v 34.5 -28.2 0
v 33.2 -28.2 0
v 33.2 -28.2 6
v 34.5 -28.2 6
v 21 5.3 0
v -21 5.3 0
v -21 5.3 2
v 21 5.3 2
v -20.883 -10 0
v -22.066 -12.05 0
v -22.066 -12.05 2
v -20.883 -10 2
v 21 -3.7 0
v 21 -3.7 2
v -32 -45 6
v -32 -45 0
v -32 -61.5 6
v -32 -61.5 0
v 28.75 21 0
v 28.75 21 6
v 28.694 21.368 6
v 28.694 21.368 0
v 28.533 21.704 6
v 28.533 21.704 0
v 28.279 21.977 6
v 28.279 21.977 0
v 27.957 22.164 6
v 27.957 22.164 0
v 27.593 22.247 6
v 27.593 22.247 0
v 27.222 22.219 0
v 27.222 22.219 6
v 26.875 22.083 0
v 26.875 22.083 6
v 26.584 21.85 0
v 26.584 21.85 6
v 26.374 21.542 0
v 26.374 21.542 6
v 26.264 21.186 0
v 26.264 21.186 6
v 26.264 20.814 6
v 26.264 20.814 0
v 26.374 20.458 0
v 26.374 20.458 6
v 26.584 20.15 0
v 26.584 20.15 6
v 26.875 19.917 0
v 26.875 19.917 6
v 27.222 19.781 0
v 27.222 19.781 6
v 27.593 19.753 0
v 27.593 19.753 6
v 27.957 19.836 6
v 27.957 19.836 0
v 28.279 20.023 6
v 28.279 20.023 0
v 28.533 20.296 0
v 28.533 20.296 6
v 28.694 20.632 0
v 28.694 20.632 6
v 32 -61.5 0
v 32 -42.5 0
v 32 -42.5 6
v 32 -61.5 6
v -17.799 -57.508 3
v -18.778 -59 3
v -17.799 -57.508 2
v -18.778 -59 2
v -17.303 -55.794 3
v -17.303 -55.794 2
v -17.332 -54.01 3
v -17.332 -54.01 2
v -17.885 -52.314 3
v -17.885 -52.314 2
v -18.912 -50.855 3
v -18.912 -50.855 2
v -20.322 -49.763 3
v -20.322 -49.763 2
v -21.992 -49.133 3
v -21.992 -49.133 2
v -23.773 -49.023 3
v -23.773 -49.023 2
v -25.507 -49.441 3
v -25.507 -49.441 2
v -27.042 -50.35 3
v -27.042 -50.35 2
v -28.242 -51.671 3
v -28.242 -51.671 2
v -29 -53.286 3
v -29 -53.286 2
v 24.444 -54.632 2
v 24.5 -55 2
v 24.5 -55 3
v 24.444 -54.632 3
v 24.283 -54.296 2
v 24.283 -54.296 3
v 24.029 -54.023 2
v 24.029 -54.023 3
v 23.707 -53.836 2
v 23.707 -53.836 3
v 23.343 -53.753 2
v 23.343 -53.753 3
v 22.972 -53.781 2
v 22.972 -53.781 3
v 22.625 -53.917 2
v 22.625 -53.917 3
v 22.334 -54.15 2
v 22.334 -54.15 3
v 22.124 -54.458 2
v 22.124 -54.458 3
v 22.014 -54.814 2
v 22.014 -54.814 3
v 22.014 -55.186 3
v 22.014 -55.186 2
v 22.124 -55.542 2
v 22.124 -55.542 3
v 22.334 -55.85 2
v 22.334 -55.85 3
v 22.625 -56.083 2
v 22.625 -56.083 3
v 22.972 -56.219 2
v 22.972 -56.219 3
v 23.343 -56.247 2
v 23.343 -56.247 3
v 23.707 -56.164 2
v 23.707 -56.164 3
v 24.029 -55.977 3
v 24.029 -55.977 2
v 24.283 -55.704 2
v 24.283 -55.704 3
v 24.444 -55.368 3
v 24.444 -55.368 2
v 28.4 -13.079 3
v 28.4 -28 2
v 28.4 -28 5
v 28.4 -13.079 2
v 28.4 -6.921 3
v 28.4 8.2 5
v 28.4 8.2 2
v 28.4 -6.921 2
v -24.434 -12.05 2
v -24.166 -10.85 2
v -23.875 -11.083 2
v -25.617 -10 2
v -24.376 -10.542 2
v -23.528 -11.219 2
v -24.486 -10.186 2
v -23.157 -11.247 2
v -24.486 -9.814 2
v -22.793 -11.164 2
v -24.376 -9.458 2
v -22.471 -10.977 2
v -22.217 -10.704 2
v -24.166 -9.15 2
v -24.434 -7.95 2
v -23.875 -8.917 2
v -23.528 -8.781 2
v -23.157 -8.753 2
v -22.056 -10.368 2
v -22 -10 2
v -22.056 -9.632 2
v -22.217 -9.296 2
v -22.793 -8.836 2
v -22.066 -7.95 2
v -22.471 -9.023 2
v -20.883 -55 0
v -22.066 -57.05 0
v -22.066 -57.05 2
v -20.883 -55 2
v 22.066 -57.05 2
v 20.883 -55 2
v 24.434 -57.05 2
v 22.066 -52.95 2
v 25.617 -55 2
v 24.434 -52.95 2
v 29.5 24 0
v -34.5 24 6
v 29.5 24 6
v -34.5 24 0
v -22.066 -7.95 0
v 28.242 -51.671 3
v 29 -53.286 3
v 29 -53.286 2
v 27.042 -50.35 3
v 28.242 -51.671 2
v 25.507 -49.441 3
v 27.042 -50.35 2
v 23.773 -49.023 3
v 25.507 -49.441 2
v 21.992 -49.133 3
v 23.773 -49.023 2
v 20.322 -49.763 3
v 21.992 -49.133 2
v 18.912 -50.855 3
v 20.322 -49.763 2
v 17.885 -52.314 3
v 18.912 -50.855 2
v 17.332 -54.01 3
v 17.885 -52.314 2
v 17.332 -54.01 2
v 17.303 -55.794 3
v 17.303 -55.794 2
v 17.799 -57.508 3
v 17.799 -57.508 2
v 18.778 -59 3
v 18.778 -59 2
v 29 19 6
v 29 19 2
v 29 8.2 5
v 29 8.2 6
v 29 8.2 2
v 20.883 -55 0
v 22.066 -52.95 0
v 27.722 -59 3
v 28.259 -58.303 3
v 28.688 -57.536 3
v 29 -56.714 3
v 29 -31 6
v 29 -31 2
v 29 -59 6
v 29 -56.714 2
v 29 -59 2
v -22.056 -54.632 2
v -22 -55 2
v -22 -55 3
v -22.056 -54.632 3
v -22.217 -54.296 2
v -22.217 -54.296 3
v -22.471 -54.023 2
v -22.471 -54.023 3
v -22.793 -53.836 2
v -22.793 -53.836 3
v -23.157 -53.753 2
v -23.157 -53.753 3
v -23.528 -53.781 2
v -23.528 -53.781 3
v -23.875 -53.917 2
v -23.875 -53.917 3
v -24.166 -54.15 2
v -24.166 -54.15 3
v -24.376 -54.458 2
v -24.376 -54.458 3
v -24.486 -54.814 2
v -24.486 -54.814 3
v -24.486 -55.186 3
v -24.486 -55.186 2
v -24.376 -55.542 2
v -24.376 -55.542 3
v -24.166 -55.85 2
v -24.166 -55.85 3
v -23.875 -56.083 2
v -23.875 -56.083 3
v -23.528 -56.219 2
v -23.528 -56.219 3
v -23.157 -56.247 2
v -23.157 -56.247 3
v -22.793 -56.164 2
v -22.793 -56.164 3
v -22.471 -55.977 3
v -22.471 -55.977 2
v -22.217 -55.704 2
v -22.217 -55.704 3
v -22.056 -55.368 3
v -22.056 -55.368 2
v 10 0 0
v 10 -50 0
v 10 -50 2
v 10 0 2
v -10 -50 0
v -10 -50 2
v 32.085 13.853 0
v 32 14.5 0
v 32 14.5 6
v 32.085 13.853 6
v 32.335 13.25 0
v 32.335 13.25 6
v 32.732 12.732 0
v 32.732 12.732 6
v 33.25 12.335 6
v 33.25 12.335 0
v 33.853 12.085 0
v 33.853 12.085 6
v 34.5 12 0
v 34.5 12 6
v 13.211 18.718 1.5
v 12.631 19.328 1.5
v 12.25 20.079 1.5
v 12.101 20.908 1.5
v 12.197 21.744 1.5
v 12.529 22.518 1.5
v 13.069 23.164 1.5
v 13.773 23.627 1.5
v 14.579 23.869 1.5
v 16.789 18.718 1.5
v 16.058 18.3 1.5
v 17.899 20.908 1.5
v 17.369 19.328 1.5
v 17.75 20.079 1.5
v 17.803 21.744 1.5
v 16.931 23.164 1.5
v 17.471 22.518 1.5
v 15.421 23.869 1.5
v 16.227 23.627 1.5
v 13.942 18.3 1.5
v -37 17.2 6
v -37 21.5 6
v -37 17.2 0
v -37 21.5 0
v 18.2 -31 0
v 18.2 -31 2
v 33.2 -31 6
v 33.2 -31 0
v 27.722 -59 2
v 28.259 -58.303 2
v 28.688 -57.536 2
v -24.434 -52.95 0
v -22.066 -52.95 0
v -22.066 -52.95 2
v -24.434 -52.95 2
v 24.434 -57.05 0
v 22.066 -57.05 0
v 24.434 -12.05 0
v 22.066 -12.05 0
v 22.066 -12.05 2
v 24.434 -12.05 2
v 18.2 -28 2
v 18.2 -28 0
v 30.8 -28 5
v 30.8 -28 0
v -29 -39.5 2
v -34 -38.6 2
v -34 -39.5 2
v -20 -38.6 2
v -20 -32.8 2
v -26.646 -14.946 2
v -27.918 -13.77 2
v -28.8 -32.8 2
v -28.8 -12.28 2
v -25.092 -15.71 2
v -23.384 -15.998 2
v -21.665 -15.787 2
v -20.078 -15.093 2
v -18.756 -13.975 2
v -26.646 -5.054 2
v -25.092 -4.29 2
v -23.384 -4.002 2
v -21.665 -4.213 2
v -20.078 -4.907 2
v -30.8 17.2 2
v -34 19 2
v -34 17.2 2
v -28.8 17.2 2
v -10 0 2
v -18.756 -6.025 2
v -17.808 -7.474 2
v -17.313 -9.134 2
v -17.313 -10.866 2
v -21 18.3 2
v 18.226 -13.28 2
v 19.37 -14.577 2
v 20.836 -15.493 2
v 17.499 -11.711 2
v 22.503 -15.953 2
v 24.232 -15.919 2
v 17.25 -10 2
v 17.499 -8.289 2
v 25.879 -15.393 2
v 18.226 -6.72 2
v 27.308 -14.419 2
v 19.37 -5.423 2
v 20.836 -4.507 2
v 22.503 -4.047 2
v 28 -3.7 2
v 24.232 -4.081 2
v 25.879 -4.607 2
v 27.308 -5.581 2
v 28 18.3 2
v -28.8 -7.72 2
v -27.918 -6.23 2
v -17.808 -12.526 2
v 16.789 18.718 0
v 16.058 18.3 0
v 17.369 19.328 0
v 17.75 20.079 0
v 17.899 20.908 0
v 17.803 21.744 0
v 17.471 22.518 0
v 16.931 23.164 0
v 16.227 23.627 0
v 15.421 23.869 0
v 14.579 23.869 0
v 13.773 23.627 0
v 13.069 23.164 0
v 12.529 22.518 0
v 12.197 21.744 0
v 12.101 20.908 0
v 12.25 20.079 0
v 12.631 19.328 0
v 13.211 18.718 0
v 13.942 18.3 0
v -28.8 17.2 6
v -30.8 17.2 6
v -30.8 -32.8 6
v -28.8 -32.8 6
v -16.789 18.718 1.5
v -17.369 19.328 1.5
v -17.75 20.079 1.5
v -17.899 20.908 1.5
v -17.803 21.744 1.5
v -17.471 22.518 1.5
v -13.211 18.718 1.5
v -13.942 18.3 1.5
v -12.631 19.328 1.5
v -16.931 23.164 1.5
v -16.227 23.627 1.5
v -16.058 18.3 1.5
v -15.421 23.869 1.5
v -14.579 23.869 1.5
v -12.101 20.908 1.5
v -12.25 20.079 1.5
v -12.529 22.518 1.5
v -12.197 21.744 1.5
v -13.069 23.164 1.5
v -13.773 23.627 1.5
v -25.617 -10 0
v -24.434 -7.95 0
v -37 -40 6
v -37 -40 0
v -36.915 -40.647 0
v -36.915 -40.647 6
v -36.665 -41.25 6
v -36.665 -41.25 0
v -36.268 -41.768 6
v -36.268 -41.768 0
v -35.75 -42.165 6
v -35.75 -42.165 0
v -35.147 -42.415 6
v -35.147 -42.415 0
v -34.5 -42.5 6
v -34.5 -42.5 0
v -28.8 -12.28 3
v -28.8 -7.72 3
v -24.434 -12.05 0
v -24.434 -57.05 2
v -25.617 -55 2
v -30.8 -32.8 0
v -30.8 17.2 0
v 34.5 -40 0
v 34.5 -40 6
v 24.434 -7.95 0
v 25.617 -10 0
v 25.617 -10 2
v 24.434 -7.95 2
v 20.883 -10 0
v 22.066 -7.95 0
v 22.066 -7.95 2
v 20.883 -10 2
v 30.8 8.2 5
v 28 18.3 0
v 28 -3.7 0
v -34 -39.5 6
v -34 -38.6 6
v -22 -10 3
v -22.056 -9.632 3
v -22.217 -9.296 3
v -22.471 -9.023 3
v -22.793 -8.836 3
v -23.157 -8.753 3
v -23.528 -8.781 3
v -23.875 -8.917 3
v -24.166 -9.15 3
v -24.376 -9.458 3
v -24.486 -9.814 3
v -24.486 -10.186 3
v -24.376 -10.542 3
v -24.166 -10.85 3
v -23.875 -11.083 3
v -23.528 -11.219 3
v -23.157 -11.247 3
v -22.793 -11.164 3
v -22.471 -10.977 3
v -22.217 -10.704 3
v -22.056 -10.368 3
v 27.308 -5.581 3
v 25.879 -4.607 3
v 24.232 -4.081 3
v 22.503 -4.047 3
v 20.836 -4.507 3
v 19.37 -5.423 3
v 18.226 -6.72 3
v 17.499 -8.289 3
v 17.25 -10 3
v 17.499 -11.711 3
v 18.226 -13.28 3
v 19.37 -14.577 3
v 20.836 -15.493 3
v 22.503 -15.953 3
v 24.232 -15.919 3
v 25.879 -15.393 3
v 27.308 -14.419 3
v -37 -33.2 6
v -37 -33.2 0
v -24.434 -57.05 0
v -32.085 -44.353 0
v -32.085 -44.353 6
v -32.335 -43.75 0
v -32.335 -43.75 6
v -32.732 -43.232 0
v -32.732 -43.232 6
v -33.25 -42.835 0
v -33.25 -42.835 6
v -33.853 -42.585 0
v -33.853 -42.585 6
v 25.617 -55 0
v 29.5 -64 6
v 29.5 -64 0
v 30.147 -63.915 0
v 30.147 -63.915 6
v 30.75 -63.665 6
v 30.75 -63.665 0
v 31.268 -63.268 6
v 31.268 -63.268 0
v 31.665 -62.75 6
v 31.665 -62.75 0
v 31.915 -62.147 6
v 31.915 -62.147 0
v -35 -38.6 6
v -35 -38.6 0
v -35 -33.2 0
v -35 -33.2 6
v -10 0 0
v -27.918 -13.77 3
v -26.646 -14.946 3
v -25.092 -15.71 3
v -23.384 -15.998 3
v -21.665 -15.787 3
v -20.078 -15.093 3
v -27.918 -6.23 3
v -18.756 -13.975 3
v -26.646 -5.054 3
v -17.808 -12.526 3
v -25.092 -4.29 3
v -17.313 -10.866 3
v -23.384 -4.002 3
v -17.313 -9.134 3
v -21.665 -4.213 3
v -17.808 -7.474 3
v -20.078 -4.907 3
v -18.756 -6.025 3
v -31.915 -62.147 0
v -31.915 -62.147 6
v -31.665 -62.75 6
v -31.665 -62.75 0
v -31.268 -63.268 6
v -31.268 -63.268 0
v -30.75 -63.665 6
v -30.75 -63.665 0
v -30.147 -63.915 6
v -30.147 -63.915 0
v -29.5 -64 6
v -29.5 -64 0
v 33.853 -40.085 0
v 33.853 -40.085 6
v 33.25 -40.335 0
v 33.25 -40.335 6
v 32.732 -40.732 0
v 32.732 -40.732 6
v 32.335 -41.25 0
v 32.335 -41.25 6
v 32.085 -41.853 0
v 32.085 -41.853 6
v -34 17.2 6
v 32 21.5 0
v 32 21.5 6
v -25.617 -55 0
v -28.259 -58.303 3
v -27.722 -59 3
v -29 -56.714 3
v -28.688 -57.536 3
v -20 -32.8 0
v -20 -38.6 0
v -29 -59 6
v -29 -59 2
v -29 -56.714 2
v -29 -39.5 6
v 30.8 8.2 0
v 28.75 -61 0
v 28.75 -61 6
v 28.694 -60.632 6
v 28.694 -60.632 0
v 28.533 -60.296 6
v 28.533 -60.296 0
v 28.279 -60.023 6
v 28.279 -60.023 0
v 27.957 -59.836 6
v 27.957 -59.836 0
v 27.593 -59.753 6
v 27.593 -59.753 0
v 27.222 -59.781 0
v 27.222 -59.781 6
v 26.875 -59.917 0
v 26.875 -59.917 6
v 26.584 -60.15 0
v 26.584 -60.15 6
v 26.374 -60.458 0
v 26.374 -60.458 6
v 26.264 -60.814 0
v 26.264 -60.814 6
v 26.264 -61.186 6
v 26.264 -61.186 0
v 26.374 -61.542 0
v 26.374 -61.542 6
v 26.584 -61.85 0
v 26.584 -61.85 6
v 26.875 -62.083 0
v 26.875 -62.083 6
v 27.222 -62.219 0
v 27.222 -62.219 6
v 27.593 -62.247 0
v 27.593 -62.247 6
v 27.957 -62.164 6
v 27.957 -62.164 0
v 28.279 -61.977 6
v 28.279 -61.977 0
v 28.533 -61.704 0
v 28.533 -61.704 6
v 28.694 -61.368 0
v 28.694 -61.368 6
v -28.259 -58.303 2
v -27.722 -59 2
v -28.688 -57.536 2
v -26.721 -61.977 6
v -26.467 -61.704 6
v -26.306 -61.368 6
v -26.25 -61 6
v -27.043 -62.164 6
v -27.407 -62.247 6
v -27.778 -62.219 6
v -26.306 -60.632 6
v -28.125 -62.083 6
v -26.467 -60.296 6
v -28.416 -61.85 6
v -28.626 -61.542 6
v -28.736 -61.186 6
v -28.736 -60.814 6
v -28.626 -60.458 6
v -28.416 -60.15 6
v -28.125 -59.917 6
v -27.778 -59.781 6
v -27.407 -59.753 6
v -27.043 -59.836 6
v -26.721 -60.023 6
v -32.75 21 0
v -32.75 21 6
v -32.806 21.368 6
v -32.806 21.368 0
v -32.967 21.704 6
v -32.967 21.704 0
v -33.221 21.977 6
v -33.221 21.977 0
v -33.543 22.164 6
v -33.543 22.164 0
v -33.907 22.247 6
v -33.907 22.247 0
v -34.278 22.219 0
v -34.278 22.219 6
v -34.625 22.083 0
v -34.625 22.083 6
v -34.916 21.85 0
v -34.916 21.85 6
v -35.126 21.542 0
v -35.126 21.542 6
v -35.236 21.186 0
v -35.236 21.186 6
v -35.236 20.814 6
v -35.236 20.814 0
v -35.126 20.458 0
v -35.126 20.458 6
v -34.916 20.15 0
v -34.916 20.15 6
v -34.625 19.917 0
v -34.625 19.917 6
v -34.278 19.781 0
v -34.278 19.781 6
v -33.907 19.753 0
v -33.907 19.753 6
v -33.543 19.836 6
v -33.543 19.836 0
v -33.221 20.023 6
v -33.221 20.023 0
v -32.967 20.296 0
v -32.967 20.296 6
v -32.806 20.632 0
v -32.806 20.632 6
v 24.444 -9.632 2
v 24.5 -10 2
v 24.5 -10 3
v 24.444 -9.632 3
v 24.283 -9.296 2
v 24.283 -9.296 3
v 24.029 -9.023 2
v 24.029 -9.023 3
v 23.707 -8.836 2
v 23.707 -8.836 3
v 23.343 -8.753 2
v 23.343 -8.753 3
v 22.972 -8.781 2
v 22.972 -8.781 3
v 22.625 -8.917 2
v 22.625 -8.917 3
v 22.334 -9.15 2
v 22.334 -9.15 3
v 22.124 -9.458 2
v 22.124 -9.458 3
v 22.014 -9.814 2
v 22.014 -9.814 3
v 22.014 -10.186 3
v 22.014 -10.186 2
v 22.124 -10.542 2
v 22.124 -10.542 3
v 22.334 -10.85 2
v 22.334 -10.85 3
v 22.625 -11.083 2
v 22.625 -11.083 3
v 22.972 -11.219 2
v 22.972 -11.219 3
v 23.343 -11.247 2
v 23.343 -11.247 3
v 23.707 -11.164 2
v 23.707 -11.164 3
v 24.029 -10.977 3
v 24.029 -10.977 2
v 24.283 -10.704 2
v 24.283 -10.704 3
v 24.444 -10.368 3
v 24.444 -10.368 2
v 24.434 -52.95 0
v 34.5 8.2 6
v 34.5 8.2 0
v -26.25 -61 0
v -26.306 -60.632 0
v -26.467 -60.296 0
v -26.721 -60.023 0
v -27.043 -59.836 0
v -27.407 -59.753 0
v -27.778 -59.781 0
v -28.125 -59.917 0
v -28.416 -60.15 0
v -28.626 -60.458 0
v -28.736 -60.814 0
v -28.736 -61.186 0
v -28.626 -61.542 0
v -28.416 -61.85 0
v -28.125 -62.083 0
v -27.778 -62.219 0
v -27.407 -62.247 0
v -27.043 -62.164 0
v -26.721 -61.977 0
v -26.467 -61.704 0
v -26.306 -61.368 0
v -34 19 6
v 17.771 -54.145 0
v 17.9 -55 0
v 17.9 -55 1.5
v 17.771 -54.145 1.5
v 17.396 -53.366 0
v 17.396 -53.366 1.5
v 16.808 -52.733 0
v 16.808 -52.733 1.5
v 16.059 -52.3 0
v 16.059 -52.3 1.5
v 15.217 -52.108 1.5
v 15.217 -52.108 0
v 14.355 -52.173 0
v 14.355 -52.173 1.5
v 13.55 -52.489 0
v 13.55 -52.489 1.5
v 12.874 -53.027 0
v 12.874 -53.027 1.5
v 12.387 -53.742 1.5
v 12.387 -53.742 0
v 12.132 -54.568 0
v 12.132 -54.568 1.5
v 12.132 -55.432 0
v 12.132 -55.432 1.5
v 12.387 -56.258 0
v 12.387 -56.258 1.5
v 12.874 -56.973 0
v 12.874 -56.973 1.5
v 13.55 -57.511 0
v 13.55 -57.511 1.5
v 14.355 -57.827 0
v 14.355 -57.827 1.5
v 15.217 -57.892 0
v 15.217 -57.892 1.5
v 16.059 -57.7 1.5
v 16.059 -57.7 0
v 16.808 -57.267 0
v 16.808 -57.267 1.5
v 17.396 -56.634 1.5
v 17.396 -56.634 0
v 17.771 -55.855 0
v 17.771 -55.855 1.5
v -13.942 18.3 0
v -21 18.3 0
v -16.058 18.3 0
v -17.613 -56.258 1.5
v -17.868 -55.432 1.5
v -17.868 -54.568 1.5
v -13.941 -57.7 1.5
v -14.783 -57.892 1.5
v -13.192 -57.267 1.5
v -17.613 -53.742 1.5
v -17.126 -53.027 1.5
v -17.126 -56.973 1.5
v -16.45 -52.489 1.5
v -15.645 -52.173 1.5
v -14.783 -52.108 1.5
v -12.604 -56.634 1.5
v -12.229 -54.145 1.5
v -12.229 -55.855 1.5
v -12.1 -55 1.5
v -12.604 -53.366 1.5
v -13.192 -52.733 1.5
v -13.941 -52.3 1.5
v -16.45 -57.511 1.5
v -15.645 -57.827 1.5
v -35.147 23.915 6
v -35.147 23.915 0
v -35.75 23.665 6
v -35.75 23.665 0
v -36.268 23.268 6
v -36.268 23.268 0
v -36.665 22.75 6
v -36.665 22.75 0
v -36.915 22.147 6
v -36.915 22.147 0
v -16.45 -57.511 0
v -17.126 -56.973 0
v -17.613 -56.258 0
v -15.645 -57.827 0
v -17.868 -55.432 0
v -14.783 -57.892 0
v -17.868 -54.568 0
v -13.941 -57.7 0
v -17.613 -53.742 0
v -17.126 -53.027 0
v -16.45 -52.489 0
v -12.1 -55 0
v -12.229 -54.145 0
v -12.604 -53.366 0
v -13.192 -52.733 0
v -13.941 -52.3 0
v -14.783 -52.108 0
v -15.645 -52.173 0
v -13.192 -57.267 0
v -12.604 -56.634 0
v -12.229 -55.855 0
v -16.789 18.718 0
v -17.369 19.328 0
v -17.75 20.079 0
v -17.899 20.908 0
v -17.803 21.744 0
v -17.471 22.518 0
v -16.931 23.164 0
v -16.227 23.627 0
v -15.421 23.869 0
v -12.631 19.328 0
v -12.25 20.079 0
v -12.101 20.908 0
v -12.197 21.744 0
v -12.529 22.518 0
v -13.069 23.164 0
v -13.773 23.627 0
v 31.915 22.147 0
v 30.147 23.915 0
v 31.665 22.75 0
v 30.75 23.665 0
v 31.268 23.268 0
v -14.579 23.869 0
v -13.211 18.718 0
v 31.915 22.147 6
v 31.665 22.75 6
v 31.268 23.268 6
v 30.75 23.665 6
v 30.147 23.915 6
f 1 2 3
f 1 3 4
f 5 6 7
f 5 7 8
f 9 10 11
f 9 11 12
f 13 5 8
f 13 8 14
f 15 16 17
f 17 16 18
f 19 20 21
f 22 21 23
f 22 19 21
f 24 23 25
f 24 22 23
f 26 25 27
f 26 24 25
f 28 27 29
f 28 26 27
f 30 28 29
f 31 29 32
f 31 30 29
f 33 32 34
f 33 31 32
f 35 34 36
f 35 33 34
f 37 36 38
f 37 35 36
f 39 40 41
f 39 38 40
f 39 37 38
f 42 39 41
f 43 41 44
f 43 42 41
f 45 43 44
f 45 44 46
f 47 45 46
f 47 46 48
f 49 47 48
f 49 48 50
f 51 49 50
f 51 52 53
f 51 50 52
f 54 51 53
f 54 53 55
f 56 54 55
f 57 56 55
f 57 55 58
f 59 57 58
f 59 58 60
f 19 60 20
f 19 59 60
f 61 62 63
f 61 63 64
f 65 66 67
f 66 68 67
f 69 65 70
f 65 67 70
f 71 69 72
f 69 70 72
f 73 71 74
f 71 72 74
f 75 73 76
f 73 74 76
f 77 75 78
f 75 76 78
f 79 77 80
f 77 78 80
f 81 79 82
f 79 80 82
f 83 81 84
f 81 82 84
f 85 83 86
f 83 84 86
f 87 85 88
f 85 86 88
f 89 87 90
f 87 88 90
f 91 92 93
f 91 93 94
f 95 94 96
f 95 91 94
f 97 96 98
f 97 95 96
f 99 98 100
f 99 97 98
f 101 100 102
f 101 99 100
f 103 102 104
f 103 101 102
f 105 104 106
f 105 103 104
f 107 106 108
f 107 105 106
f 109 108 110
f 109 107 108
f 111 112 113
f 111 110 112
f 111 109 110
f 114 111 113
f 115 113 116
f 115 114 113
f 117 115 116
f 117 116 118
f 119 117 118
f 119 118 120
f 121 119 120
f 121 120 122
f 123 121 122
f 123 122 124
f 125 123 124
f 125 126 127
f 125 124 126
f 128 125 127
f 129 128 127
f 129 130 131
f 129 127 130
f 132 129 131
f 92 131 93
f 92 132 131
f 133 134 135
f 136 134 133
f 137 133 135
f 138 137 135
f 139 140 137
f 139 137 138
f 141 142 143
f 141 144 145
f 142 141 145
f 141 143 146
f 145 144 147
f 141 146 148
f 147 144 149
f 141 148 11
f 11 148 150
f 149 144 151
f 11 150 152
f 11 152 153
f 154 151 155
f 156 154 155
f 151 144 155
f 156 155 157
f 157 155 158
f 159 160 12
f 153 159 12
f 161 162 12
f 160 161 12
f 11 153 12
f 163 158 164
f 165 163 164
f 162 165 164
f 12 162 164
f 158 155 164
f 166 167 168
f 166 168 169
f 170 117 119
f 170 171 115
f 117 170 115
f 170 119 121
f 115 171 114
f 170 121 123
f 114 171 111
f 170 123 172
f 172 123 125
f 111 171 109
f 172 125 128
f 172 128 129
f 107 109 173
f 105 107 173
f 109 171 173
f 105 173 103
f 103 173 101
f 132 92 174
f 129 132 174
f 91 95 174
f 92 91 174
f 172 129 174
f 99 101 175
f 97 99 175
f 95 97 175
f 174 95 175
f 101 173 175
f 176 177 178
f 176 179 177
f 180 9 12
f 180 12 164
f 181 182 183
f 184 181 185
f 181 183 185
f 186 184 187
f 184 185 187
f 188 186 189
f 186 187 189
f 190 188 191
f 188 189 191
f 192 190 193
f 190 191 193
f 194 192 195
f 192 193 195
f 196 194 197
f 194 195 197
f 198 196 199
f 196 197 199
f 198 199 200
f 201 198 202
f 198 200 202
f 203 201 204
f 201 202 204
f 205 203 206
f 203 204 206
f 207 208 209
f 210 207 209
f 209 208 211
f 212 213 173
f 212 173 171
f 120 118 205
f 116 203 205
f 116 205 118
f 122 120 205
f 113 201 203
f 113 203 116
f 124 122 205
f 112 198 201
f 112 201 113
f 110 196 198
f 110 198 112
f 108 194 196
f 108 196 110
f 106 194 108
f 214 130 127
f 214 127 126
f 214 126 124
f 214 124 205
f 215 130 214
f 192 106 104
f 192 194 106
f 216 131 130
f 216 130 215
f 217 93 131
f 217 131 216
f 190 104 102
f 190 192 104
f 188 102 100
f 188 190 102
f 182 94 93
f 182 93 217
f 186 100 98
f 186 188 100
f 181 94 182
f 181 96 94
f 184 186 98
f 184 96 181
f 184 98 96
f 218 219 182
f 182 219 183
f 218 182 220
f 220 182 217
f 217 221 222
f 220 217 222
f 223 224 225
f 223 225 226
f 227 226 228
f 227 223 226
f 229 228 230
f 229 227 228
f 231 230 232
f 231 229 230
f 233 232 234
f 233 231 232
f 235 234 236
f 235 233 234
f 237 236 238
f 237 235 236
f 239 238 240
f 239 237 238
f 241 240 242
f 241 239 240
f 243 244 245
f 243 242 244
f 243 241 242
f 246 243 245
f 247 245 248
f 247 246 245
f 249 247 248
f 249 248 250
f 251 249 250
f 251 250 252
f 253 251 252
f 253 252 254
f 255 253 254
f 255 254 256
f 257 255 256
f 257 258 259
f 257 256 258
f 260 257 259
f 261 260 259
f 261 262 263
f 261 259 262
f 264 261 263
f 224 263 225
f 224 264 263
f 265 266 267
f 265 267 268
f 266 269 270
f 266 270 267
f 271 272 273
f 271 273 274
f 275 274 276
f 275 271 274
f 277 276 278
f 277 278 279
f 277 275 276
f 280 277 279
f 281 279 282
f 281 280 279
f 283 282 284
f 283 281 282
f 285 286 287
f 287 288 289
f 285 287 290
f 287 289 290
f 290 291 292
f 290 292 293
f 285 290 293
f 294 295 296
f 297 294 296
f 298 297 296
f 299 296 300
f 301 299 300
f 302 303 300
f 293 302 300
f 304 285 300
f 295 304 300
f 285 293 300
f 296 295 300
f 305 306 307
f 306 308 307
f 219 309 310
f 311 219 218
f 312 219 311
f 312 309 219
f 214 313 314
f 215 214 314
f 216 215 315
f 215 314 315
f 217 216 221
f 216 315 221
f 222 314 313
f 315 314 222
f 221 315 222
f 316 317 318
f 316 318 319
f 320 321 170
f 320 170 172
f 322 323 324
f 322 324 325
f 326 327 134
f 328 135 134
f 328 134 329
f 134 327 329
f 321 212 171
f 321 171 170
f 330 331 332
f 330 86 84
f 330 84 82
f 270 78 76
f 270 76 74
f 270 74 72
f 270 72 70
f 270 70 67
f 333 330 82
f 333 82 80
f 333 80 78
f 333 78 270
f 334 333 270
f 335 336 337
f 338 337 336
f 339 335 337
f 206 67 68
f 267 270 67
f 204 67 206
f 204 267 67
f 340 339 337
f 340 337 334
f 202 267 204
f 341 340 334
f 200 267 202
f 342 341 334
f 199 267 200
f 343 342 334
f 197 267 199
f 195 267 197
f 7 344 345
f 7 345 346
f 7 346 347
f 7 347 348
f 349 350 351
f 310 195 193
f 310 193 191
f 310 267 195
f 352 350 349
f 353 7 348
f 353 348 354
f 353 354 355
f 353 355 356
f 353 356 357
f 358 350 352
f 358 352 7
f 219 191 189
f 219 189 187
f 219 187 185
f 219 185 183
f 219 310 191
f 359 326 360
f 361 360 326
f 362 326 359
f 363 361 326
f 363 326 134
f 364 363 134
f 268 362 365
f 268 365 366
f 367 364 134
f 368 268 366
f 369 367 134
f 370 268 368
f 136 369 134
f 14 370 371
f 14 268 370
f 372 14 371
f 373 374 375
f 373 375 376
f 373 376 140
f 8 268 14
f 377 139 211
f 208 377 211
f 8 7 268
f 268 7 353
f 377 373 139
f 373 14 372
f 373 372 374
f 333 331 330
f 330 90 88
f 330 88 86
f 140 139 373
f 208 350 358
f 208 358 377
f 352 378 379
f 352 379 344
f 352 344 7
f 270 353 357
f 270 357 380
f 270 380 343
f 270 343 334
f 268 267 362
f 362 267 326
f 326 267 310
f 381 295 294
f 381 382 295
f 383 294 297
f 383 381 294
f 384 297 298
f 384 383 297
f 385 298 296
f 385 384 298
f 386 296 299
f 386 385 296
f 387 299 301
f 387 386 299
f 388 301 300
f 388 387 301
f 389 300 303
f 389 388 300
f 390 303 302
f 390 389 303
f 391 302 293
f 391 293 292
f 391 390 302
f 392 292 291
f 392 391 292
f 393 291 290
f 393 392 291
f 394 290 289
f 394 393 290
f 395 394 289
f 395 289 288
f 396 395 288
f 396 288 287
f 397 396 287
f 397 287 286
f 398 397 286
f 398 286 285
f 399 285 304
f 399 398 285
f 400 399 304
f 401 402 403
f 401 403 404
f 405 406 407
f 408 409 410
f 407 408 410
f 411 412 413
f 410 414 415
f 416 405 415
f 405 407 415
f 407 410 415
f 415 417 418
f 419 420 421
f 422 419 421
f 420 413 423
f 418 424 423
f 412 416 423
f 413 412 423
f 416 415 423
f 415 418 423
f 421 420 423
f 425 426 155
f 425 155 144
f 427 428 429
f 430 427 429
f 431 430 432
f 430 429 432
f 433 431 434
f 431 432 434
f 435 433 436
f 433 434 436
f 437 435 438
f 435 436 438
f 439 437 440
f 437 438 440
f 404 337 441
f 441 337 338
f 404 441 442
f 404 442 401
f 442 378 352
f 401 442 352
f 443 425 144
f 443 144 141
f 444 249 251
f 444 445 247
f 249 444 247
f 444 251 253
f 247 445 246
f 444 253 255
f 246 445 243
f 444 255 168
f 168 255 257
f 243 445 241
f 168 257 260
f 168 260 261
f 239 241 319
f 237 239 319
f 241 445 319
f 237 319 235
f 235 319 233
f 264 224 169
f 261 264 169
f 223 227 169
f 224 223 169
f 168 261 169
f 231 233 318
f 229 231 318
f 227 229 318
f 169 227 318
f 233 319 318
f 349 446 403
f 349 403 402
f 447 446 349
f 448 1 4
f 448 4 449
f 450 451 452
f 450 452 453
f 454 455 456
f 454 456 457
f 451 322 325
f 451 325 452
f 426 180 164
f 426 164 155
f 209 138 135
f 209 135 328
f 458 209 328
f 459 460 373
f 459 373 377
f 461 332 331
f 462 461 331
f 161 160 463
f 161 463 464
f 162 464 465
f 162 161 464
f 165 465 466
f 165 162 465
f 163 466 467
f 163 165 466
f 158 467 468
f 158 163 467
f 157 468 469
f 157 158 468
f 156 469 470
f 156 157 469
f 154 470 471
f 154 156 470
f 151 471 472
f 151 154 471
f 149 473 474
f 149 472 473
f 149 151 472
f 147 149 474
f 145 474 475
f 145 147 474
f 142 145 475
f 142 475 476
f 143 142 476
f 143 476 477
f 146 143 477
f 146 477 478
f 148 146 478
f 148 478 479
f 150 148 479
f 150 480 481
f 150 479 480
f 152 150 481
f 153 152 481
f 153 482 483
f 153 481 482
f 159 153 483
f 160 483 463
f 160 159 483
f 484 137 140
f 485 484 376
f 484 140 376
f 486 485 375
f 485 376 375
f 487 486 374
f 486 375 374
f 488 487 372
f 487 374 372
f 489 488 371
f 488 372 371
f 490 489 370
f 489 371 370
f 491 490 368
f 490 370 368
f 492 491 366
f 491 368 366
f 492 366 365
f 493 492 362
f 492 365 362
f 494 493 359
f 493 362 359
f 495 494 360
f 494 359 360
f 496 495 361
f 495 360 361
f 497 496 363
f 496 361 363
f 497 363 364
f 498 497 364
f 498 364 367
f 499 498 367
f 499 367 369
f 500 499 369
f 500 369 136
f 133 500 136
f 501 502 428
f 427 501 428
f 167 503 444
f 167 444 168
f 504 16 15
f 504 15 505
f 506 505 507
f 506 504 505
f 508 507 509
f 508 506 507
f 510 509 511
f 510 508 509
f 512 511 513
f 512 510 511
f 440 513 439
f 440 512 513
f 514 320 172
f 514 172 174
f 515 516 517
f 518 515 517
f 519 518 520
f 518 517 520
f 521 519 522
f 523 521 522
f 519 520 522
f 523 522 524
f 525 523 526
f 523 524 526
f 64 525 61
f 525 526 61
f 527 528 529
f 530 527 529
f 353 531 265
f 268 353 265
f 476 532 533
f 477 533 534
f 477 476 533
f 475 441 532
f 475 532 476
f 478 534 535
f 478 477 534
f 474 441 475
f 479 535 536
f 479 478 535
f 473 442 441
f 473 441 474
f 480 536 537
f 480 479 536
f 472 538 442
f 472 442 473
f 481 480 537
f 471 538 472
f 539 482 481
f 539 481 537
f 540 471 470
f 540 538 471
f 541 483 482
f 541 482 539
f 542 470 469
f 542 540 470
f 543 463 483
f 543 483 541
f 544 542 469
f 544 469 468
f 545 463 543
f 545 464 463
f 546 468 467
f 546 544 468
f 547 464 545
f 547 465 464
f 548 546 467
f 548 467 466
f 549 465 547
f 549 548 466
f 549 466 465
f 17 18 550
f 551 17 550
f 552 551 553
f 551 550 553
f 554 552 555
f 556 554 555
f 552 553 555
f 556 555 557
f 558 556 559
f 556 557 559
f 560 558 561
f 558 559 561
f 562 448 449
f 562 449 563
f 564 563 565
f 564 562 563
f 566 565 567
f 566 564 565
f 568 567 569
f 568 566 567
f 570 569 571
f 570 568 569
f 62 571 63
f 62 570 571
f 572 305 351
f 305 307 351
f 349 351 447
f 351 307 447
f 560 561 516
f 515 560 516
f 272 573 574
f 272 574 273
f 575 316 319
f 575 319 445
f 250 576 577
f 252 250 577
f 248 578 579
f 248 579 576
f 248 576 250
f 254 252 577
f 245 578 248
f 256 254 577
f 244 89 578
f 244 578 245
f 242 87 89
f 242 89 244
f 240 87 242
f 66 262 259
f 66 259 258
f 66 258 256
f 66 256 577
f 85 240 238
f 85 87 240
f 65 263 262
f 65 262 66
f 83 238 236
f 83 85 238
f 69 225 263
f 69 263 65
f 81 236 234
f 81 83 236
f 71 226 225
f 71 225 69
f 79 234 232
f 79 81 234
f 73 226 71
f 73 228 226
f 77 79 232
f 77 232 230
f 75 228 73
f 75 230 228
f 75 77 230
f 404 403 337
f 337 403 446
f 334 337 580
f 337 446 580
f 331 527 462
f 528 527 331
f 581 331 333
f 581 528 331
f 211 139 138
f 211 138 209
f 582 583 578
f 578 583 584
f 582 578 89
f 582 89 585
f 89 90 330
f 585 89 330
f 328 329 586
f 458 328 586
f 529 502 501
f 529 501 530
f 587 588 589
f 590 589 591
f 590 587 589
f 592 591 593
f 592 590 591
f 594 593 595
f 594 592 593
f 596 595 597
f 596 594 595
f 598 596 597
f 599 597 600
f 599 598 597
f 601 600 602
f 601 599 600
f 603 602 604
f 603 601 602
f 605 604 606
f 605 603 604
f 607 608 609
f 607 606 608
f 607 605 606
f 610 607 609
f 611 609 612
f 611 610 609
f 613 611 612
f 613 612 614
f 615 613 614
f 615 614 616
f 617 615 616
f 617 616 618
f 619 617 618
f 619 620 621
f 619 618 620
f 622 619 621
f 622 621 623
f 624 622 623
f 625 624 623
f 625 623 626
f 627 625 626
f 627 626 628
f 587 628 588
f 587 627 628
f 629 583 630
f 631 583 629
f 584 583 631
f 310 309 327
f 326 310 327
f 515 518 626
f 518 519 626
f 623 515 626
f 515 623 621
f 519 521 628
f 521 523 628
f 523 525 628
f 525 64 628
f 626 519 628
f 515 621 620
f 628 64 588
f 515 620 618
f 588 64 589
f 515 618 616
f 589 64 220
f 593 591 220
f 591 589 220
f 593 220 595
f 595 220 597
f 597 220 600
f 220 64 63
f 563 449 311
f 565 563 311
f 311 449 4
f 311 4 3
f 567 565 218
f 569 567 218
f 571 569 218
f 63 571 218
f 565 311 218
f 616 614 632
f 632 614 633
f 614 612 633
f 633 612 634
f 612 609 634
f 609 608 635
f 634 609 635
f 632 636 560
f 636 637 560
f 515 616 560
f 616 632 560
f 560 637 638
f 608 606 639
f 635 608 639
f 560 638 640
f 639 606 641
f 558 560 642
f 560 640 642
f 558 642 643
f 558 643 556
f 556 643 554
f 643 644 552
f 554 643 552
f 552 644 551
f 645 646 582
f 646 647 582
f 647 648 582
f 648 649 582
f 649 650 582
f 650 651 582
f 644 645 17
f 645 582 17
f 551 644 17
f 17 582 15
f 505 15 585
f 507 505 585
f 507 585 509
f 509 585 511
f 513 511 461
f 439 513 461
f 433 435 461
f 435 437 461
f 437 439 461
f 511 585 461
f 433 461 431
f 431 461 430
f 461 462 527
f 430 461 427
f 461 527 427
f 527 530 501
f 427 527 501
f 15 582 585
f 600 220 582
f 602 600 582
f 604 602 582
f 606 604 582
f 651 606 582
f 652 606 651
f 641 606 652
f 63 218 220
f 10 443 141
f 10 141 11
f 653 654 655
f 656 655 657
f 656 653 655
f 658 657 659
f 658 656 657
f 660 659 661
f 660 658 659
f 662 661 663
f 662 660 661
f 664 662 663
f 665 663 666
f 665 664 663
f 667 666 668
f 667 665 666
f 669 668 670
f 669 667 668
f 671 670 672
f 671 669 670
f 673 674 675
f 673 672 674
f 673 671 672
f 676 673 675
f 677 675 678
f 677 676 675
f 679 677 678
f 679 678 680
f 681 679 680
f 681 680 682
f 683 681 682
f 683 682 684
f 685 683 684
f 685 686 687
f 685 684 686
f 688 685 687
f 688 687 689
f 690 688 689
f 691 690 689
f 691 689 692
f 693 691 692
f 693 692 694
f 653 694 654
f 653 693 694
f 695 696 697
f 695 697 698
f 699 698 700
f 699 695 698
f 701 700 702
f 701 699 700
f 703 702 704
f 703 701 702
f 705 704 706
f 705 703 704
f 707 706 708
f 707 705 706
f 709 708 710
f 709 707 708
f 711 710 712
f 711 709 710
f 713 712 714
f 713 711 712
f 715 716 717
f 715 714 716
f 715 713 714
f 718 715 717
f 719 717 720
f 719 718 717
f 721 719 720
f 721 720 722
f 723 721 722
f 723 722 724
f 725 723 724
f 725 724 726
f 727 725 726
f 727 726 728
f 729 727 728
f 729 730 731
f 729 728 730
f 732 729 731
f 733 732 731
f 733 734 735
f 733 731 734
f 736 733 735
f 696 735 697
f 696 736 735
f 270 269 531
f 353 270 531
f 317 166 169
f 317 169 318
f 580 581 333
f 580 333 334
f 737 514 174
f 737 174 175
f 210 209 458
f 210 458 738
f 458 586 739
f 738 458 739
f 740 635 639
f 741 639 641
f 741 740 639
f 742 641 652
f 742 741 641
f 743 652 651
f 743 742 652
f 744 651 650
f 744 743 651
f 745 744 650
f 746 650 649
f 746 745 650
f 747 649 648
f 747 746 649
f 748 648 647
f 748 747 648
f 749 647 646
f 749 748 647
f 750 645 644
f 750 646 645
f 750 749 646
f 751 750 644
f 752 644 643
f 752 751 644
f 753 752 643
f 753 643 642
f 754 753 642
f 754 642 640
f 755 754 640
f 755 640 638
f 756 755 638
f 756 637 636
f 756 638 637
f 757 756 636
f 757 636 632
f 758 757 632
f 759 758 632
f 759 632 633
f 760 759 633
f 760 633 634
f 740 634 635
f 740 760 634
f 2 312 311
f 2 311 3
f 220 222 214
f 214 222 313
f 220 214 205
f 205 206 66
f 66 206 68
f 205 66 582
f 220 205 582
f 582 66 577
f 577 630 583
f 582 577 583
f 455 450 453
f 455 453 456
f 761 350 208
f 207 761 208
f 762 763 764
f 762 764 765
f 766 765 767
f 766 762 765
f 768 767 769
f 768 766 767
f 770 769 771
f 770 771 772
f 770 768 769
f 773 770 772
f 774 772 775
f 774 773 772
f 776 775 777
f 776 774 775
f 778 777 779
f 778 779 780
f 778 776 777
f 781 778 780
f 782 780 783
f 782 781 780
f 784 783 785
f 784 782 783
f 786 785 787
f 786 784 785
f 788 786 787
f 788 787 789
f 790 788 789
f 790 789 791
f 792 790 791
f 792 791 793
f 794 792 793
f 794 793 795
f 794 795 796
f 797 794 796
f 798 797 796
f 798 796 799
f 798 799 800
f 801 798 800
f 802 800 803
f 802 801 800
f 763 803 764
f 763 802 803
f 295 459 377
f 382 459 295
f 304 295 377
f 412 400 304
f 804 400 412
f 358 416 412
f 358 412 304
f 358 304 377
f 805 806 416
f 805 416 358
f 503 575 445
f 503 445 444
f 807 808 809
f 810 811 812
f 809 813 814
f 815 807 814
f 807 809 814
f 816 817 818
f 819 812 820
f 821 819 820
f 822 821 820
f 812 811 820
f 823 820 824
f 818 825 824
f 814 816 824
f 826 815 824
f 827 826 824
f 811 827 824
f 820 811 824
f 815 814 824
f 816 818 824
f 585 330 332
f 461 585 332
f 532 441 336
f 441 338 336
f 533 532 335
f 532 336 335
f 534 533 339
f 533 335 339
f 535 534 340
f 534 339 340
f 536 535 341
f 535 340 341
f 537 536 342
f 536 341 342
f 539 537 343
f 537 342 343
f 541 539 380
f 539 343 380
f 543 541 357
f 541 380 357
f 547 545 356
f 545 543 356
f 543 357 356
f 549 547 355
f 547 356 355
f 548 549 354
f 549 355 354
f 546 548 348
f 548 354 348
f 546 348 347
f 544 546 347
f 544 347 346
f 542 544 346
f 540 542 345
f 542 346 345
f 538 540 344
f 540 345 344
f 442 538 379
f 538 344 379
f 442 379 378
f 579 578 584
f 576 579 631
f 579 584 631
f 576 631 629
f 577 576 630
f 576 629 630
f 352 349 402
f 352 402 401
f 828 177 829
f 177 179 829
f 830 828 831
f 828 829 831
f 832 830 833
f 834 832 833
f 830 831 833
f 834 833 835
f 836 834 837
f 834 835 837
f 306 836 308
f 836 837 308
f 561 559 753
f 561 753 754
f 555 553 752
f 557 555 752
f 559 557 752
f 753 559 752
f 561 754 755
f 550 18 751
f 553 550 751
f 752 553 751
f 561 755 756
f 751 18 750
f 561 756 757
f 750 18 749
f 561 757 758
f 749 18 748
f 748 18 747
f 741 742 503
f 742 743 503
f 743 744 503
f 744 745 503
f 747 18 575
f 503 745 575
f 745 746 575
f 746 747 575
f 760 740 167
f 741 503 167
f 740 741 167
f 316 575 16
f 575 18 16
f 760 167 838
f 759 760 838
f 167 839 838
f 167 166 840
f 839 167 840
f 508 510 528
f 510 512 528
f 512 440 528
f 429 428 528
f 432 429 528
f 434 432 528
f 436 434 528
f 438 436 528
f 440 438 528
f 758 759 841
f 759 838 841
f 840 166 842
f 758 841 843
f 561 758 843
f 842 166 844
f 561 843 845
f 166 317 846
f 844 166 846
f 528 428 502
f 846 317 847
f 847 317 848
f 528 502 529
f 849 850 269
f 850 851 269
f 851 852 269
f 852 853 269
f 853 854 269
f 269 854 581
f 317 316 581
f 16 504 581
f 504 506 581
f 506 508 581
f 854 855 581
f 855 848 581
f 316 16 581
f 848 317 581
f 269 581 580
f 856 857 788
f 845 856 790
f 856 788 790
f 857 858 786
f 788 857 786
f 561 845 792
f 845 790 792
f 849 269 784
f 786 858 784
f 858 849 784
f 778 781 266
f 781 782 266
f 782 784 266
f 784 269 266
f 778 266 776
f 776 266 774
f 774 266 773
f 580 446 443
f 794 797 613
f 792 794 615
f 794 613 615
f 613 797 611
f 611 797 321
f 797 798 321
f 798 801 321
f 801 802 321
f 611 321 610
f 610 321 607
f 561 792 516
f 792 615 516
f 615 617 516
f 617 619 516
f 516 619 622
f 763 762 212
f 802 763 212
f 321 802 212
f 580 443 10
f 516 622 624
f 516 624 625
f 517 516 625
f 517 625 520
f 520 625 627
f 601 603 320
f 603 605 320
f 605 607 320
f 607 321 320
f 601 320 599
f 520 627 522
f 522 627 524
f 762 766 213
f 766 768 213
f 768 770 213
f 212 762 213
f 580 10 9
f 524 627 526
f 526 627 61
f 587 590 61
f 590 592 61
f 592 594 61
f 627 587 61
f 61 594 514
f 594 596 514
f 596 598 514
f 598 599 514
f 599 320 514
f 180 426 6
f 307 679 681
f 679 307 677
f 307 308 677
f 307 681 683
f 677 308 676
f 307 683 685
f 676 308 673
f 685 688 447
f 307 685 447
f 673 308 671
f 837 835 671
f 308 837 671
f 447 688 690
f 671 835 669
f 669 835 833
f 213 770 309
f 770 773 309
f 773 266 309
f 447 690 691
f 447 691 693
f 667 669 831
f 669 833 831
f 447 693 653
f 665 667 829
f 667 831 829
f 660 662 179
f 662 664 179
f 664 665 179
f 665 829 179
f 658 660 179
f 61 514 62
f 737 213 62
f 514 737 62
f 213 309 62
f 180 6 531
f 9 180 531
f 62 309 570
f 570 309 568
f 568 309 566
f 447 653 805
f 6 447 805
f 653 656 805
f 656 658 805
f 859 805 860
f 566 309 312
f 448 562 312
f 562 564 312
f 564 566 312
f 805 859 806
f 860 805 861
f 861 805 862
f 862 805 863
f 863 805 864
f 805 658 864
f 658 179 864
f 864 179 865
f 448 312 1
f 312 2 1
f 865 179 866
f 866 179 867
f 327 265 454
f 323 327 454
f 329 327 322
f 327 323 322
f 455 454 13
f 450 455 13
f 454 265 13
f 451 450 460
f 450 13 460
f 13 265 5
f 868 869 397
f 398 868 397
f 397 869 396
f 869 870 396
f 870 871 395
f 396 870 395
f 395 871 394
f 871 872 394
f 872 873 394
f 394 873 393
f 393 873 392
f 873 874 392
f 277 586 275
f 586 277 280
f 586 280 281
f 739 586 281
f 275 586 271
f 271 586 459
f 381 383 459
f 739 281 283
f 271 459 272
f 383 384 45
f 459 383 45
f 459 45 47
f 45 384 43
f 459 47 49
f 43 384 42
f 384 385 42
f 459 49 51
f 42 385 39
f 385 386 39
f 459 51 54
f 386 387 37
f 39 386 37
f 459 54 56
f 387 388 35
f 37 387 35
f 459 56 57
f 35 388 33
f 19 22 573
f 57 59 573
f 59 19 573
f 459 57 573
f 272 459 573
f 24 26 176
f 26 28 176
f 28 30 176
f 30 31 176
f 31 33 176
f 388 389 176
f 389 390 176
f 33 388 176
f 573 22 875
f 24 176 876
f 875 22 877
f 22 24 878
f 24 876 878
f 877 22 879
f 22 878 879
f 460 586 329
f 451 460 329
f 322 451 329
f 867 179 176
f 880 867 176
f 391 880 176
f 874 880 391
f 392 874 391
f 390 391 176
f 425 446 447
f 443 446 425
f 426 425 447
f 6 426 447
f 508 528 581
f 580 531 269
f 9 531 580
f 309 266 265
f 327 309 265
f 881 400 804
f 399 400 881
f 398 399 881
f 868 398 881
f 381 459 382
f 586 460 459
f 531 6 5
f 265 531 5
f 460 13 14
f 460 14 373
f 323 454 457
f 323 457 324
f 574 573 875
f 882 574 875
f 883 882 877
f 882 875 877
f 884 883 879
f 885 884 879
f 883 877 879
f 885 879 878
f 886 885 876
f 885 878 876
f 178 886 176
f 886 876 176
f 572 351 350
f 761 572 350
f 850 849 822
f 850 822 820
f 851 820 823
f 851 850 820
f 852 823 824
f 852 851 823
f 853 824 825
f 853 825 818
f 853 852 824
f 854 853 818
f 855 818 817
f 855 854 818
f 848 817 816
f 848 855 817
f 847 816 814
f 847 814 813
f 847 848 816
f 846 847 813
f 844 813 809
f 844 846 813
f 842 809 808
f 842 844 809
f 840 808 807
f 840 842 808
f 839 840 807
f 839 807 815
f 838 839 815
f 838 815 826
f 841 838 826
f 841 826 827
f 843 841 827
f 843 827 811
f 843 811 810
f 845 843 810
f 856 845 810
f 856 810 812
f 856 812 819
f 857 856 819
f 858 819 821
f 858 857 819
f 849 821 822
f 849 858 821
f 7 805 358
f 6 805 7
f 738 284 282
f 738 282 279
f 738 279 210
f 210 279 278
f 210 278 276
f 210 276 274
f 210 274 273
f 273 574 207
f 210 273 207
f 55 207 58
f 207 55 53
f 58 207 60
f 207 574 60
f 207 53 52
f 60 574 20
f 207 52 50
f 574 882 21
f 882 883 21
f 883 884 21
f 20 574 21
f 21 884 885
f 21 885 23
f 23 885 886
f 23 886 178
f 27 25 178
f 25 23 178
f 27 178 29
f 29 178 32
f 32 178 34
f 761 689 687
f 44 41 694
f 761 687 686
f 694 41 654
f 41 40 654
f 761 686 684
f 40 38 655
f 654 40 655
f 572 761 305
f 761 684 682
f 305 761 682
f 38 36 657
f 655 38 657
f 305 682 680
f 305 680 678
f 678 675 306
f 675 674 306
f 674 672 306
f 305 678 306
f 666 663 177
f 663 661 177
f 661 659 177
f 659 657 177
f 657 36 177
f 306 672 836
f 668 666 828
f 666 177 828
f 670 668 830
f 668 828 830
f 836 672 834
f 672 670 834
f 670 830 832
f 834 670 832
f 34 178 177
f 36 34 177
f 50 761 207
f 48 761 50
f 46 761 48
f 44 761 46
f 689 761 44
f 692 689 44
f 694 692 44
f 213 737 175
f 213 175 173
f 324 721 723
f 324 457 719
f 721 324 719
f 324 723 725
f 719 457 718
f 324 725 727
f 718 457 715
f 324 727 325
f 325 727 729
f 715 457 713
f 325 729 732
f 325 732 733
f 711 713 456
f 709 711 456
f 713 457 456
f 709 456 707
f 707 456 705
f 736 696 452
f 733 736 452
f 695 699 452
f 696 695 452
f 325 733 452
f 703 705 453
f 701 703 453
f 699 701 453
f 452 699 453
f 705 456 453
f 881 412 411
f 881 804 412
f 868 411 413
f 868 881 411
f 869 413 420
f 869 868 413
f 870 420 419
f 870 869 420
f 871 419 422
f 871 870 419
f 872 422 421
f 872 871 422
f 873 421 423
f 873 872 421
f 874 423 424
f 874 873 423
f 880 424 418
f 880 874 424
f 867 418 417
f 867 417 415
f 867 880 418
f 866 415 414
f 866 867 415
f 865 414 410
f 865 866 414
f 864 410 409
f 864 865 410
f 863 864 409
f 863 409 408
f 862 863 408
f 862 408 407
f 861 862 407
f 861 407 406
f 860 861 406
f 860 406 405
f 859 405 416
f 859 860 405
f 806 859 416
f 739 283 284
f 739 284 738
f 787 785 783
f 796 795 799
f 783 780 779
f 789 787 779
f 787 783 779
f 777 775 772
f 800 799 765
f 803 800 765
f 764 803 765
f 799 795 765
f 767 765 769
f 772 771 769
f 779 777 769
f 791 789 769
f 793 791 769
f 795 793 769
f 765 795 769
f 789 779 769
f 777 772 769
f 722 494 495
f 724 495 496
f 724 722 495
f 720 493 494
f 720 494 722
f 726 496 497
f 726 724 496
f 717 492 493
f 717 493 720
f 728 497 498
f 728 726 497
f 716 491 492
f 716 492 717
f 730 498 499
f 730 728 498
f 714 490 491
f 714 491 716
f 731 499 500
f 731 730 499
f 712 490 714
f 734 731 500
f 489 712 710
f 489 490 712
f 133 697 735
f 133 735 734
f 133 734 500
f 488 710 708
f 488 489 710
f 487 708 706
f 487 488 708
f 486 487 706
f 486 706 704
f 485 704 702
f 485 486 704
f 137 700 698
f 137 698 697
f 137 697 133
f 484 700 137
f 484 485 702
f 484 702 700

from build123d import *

# Parameters (mm, degrees)
PAD_DEPTH            = 2
SKETCH002_R          = 6
PAD002_DEPTH         = 3
POCKET_DEPTH         = 3.001
SKETCH005_R          = 1.25
POCKET001_DEPTH      = 0.001
POCKET001_DEPTH_BACK = 3.001
POCKET002_DEPTH      = 2
SKETCH012_W          = 25
SKETCH012_H          = 50.4
SKETCH012_H_2        = 36.4
POCKET006_DEPTH      = 0.001
POCKET006_DEPTH_BACK = 3.001
SKETCH014_W          = 2
SKETCH014_H          = 50.4
PAD006_DEPTH         = 4
SKETCH015_W          = 2.4
SKETCH015_H          = 36.4
PAD007_DEPTH         = 3
SKETCH018_R          = 2.9
POCKET008_DEPTH      = 1.5
PAD010_DEPTH         = 4
SKETCH024_R          = 1.25
POCKET010_DEPTH      = 0.001
POCKET010_DEPTH_BACK = 6.001
SKETCH032_W          = 20
SKETCH032_H          = 50
POCKET016_DEPTH      = 0.001
POCKET016_DEPTH_BACK = 6.001
SKETCH041_W          = 15
SKETCH041_H          = 5.8
SKETCH041_H_2        = 3
POCKET020_DEPTH      = 0.001
POCKET020_DEPTH_BACK = 6.001


with BuildPart() as part:
    # Sketch → Pad (new body)
    with BuildSketch(Plane.XY):
        with BuildLine():
            Line((-29.5, -64), (29.5, -64))
            ThreePointArc((29.5, -64), (31.267767, -63.267767), (32, -61.5))
            Line((32, -42.5), (32, -61.5))
            ThreePointArc((34.5, -40), (32.732233, -40.732233), (32, -42.5))
            Line((34.5, 12), (34.5, -40))
            ThreePointArc((32, 14.5), (32.732233, 12.732233), (34.5, 12))
            Line((32, 21.5), (32, 14.5))
            ThreePointArc((32, 21.5), (31.267767, 23.267767), (29.5, 24))
            Line((29.5, 24), (-34.5, 24))
            ThreePointArc((-34.5, 24), (-36.267767, 23.267767), (-37, 21.5))
            Line((-37, 21.5), (-37, -40))
            ThreePointArc((-37, -40), (-36.267767, -41.767767), (-34.5, -42.5))
            ThreePointArc((-32, -45), (-32.732233, -43.232233), (-34.5, -42.5))
            Line((-32, -45), (-32, -61.5))
            ThreePointArc((-32, -61.5), (-31.267767, -63.267767), (-29.5, -64))
        make_face()
    extrude(amount=PAD_DEPTH)

    # Sketch002 → Pad002 (join)
    with BuildSketch(Plane.XY):
        with Locations((-23.25, -55)):
            Circle(SKETCH002_R)
        with Locations((23.25, -55)):
            Circle(SKETCH002_R)
        with Locations((-23.25, -10)):
            Circle(SKETCH002_R)
        with Locations((23.25, -10)):
            Circle(SKETCH002_R)
    extrude(amount=PAD002_DEPTH)

    # Sketch004 → Pocket (cut, through all)
    with BuildSketch(Plane.XY):
        Polygon((-21, 18.3), (-21, 5.3), (21, 5.3), (21, -3.7), (28, -3.7), (28, 18.3), align=None)
    extrude(amount=POCKET_DEPTH, mode=Mode.SUBTRACT)

    # Sketch005 → Pocket001 (cut, two sides)
    with BuildSketch(Plane.XY) as pocket001_sk:
        with Locations((-23.25, -10)):
            Circle(SKETCH005_R)
        with Locations((23.25, -10)):
            Circle(SKETCH005_R)
        with Locations((-23.25, -55)):
            Circle(SKETCH005_R)
        with Locations((23.25, -55)):
            Circle(SKETCH005_R)
    extrude(amount=-POCKET001_DEPTH, mode=Mode.SUBTRACT)
    extrude(pocket001_sk.sketch, amount=POCKET001_DEPTH_BACK, mode=Mode.SUBTRACT)

    # Sketch003 → Pocket002 (cut)
    with BuildSketch(Plane.XY):
        Polygon((-20.882864, -10), (-22.066432, -7.95), (-24.433568, -7.95), (-25.617136, -10), (-24.433568, -12.05), (-22.066432, -12.05), align=None)
        Polygon((25.617136, -10), (24.433568, -7.95), (22.066432, -7.95), (20.882864, -10), (22.066432, -12.05), (24.433568, -12.05), align=None)
        Polygon((-22.066432, -52.95), (-24.433568, -52.95), (-25.617136, -55), (-24.433568, -57.05), (-22.066432, -57.05), (-20.882864, -55), align=None)
        Polygon((24.433568, -52.95), (22.066432, -52.95), (20.882864, -55), (22.066432, -57.05), (24.433568, -57.05), (25.617136, -55), align=None)
    extrude(amount=POCKET002_DEPTH, mode=Mode.SUBTRACT)

    # Sketch012 → Pocket006 (cut, two sides)
    with BuildSketch(Plane.XY) as pocket006_sk:
        with Locations((-43.3, -8)):
            Rectangle(SKETCH012_W, SKETCH012_H)
        with Locations((43.3, -10)):
            Rectangle(SKETCH012_W, SKETCH012_H_2)
    extrude(amount=-POCKET006_DEPTH, mode=Mode.SUBTRACT)
    extrude(pocket006_sk.sketch, amount=POCKET006_DEPTH_BACK, mode=Mode.SUBTRACT)

    # Sketch014 (on Face5 of Pocket006) → Pad006 (join)
    with BuildSketch(Plane.XY.offset(2)):
        with Locations((-29.8, -8)):
            Rectangle(SKETCH014_W, SKETCH014_H)
    extrude(amount=PAD006_DEPTH)

    # Sketch015 (on Face5 of Pocket006) → Pad007 (join)
    with BuildSketch(Plane.XY.offset(2)):
        with Locations((29.6, -10)):
            Rectangle(SKETCH015_W, SKETCH015_H)
    extrude(amount=PAD007_DEPTH)

    # Sketch018 → Pocket008 (cut)
    with BuildSketch(Plane.XY):
        with Locations((-15, 21)):
            Circle(SKETCH018_R)
        with Locations((15, 21)):
            Circle(SKETCH018_R)
        with Locations((-15, -55)):
            Circle(SKETCH018_R)
        with Locations((15, -55)):
            Circle(SKETCH018_R)
    extrude(amount=POCKET008_DEPTH, mode=Mode.SUBTRACT)

    # Sketch020 (on Face5 of Pocket008) → Pad010 (join)
    with BuildSketch(Plane.XY.offset(2)):
        with BuildLine():
            Line((-34.5, 24), (29.5, 24))
            ThreePointArc((32, 21.5), (31.267767, 23.267767), (29.5, 24))
            Line((32, 21.5), (32, 14.5))
            ThreePointArc((32, 14.5), (32.732233, 12.732233), (34.5, 12))
            Line((34.5, 12), (34.5, 8.2))
            Line((29, 8.2), (34.5, 8.2))
            Line((29, 19), (29, 8.2))
            Line((-34, 19), (29, 19))
            Line((-34, 17.2), (-34, 19))
            Line((-37, 17.2), (-34, 17.2))
            Line((-37, 21.5), (-37, 17.2))
            ThreePointArc((-34.5, 24), (-36.267767, 23.267767), (-37, 21.5))
        make_face()
        with BuildLine():
            Line((34.5, -28.2), (34.5, -40))
            ThreePointArc((34.5, -40), (32.732233, -40.732233), (32, -42.5))
            Line((32, -42.5), (32, -61.5))
            ThreePointArc((29.5, -64), (31.267767, -63.267767), (32, -61.5))
            Line((29.5, -64), (-29.5, -64))
            ThreePointArc((-32, -61.5), (-31.267767, -63.267767), (-29.5, -64))
            Line((-32, -61.5), (-32, -45))
            ThreePointArc((-32, -45), (-32.732233, -43.232233), (-34.5, -42.5))
            ThreePointArc((-37, -40), (-36.267767, -41.767767), (-34.5, -42.5))
            Line((-37, -40), (-37, -33.2))
            Line((-34, -33.2), (-37, -33.2))
            Line((-34, -39.5), (-34, -33.2))
            Line((-29, -39.5), (-34, -39.5))
            Line((-29, -59), (-29, -39.5))
            Line((29, -59), (-29, -59))
            Line((29, -28.2), (29, -59))
            Line((34.5, -28.2), (29, -28.2))
        make_face()
    extrude(amount=PAD010_DEPTH)

    # Sketch024 → Pocket010 (cut, two sides)
    with BuildSketch(Plane.XY) as pocket010_sk:
        with Locations((-34, 21)):
            Circle(SKETCH024_R)
        with Locations((27.5, 21)):
            Circle(SKETCH024_R)
        with Locations((27.5, -61)):
            Circle(SKETCH024_R)
        with Locations((-27.5, -61)):
            Circle(SKETCH024_R)
    extrude(amount=-POCKET010_DEPTH, mode=Mode.SUBTRACT)
    extrude(pocket010_sk.sketch, amount=POCKET010_DEPTH_BACK, mode=Mode.SUBTRACT)

    # Sketch032 → Pocket016 (cut, two sides)
    with BuildSketch(Plane.XY) as pocket016_sk:
        with Locations((0, -25)):
            Rectangle(SKETCH032_W, SKETCH032_H)
    extrude(amount=-POCKET016_DEPTH, mode=Mode.SUBTRACT)
    extrude(pocket016_sk.sketch, amount=POCKET016_DEPTH_BACK, mode=Mode.SUBTRACT)

    # Sketch041 → Pocket020 (cut, two sides)
    with BuildSketch(Plane.XY) as pocket020_sk:
        with Locations((-27.5, -35.7)):
            Rectangle(SKETCH041_W, SKETCH041_H)
        with Locations((25.7, -29.5)):
            Rectangle(SKETCH041_W, SKETCH041_H_2)
    extrude(amount=-POCKET020_DEPTH, mode=Mode.SUBTRACT)
    extrude(pocket020_sk.sketch, amount=POCKET020_DEPTH_BACK, mode=Mode.SUBTRACT)


solid = part.part
